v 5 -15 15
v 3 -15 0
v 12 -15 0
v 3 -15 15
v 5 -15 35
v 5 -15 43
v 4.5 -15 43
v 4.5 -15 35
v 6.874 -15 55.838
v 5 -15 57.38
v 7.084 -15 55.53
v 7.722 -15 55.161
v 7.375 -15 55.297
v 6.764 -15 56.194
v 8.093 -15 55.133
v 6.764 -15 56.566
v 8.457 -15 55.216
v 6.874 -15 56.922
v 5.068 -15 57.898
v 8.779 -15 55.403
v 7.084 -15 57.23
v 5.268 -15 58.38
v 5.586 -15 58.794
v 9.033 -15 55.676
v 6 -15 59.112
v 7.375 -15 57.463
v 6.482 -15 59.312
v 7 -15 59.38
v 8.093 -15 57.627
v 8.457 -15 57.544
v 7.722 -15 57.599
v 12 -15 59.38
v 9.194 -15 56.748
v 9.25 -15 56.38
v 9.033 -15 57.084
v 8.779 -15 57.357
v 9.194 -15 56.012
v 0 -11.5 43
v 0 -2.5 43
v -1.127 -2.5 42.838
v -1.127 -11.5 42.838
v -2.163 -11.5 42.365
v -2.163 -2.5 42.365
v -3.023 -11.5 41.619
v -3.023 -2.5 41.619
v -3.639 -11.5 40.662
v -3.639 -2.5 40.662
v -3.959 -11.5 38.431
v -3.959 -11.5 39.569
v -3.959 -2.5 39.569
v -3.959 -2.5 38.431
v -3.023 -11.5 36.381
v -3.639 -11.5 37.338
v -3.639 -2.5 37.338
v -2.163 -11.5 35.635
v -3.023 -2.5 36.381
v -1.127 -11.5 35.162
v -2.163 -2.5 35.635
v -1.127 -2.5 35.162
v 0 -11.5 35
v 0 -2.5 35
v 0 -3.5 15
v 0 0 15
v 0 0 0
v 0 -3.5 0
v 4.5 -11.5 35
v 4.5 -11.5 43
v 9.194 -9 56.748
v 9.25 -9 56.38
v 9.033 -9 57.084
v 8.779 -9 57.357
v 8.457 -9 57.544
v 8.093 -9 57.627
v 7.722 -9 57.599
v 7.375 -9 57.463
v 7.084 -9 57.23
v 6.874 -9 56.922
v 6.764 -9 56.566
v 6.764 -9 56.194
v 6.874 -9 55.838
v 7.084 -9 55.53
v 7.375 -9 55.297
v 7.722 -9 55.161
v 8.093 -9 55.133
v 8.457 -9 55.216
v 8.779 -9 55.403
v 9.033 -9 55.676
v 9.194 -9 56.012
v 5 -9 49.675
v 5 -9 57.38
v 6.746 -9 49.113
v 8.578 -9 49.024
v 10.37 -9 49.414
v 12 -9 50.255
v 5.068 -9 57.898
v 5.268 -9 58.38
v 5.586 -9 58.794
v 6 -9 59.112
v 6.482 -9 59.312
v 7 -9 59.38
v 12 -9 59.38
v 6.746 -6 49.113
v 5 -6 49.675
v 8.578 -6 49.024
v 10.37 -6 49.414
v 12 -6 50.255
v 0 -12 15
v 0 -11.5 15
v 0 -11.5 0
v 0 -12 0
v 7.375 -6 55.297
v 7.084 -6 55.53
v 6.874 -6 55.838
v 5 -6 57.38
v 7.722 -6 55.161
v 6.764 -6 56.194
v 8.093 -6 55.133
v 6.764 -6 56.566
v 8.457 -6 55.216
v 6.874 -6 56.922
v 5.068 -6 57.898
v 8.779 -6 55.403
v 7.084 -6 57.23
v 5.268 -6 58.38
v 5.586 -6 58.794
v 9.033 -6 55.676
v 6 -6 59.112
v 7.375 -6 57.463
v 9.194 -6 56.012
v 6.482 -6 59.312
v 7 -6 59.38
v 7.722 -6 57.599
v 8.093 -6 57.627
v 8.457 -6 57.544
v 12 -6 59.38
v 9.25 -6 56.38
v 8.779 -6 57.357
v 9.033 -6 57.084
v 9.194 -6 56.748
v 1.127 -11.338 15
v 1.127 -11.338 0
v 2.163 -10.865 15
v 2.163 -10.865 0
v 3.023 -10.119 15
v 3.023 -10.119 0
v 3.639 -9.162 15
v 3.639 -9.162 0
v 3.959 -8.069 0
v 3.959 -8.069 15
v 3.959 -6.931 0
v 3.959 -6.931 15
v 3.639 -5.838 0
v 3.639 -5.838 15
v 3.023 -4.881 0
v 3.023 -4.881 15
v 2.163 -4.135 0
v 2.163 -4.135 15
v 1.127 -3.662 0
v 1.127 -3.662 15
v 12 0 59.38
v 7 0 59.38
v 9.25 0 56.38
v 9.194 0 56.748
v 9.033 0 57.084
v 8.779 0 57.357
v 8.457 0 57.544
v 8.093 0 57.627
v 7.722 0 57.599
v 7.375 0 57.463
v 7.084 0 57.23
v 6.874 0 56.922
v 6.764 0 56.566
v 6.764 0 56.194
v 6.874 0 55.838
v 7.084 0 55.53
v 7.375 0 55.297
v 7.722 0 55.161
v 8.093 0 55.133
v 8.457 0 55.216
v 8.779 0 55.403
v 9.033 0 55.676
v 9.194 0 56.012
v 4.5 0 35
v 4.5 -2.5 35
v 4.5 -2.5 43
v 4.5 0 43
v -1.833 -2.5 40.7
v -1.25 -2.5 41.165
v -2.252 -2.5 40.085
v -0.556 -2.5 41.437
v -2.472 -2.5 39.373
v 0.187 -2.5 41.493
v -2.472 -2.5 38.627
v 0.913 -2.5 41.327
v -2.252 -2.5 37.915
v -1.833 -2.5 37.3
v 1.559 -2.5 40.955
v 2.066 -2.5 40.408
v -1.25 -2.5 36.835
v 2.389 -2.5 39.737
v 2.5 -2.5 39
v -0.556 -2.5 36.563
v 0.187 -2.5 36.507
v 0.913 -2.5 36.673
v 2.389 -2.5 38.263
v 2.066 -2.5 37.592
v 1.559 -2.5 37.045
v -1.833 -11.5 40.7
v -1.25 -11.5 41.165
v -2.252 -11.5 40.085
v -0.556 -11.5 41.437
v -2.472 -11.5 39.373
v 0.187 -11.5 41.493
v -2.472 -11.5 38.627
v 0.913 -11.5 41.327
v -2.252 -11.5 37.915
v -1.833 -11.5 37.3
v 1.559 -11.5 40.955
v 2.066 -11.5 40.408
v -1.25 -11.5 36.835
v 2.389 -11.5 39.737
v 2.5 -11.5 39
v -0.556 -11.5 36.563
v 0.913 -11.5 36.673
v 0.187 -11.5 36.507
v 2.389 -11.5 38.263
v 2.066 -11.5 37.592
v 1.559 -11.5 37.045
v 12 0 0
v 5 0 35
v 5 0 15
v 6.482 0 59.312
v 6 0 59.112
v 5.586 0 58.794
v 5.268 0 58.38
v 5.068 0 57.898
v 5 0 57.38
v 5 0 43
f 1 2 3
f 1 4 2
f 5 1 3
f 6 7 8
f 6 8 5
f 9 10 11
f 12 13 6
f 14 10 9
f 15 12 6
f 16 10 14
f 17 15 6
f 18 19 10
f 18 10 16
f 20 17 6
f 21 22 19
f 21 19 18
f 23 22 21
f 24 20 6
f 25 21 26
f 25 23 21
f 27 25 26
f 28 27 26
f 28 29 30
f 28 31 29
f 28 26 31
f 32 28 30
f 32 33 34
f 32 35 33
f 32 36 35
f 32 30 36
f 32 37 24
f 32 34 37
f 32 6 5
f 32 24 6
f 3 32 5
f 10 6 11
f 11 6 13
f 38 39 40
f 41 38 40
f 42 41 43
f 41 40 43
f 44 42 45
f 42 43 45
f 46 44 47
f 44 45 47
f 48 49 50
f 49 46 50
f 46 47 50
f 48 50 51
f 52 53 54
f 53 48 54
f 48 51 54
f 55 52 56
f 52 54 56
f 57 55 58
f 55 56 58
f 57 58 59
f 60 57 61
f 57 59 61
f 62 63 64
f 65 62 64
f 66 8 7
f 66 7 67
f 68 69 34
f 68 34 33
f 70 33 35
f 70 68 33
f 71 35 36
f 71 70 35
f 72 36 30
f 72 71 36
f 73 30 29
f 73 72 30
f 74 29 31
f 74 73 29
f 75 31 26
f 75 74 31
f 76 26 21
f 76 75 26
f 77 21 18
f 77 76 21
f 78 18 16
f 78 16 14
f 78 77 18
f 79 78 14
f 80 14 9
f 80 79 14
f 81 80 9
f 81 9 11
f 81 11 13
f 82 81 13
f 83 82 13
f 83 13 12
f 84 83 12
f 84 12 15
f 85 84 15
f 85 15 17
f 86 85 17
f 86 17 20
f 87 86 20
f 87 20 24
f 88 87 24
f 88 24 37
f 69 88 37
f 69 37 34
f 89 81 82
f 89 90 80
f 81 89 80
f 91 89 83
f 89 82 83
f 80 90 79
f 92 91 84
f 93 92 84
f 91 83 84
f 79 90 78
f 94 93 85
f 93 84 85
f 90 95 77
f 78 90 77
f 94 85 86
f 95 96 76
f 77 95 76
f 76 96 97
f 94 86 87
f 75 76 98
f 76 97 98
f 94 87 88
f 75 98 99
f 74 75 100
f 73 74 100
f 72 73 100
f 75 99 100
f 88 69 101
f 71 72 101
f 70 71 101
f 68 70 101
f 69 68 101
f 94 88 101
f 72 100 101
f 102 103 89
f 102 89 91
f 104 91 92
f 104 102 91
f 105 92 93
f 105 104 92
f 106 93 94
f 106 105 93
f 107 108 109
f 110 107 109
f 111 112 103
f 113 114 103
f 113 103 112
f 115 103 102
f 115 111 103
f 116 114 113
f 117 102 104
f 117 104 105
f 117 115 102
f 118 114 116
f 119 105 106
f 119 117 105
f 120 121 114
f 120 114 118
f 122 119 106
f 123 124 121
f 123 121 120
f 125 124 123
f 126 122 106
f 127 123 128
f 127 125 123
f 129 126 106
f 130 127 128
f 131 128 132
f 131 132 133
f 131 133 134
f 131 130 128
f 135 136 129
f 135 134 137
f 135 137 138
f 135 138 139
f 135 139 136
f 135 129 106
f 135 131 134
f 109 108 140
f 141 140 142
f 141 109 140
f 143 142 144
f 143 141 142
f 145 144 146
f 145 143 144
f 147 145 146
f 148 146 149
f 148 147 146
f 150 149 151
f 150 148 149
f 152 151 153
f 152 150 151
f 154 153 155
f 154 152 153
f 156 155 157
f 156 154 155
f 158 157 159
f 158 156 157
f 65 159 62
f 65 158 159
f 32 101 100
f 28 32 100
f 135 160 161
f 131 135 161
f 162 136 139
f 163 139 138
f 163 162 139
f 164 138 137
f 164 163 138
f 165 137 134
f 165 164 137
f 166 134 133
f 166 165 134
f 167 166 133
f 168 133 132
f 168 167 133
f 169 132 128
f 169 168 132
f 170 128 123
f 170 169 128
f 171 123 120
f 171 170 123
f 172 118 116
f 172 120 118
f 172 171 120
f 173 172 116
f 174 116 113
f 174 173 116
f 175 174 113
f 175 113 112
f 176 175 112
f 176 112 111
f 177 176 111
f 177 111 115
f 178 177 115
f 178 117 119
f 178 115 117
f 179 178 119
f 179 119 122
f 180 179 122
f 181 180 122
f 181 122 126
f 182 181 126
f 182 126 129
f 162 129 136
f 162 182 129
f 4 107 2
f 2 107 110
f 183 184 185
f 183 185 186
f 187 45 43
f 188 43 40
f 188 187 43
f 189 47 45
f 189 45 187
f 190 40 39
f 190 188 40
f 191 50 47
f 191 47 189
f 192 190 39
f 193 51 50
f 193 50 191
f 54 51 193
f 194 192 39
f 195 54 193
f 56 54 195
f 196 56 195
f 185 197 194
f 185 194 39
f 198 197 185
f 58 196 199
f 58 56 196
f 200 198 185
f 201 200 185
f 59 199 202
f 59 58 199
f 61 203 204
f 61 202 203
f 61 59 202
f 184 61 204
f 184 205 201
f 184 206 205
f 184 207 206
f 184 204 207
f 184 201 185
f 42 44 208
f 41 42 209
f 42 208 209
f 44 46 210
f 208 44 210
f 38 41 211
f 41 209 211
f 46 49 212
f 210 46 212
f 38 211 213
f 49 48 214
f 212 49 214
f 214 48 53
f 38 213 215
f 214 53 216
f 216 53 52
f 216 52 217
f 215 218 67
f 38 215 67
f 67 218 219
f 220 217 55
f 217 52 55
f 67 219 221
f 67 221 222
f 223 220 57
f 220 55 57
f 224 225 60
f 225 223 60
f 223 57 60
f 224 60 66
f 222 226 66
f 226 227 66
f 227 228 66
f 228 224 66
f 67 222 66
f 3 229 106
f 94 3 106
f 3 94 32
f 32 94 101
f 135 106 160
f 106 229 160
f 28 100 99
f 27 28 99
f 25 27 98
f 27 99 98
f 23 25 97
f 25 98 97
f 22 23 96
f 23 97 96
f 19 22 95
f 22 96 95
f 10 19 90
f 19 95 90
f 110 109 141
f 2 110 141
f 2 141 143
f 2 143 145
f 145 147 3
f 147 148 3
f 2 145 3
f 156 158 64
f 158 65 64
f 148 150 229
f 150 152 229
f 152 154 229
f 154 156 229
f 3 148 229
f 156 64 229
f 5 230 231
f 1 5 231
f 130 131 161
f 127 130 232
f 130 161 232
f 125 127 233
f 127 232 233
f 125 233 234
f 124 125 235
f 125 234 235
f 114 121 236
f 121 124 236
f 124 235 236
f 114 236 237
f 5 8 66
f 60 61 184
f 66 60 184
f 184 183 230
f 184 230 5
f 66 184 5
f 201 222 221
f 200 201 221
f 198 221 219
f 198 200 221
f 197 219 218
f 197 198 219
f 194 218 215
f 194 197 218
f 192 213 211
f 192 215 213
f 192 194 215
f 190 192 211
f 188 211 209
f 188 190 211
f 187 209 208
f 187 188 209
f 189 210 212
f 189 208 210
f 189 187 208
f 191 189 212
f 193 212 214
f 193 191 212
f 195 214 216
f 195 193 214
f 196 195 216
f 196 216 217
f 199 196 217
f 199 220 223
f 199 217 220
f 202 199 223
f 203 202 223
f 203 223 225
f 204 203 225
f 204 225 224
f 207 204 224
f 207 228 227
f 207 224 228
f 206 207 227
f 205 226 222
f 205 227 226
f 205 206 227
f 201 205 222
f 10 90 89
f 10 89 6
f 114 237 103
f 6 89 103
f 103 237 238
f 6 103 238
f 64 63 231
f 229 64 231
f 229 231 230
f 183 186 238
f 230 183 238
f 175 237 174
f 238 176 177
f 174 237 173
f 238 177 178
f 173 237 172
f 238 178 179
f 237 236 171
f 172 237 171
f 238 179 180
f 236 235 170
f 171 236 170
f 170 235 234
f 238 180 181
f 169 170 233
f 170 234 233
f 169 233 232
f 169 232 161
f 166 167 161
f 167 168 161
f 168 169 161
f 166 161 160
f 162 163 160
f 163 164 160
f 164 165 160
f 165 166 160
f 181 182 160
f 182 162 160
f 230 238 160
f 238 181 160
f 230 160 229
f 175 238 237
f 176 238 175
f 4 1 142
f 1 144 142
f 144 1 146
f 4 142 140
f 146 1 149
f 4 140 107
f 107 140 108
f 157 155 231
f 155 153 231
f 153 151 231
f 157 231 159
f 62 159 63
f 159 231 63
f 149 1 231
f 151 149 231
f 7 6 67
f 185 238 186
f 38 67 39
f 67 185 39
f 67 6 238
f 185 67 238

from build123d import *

# Parameters (mm, degrees)
SKETCH010_R       = 2.5
SKETCH010_R_2     = 1.25
PAD008_DEPTH      = 15
BOX001_W          = 11
BOX001_H          = 10
BOX001_DEPTH      = 10
BOX002_W          = 10
BOX002_H          = 10
BOX002_DEPTH      = 10
CHAMFER002_SIZE   = 3
CYLINDER004_R     = 7
CYLINDER004_DEPTH = 3
CYLINDER005_R     = 4
CYLINDER005_DEPTH = 31


with BuildPart() as part:
    # Sketch010 → Pad008 (new body)
    with BuildSketch(Plane.XZ):
        with BuildLine():
            Line((0, 35), (5, 35))
            Line((5, 35), (5, 15))
            Line((5, 15), (0, 15))
            Line((0, 15), (0, 0))
            Line((0, 0), (12, 0))
            Line((12, 0), (12, 59.38))
            Line((12, 59.38), (7, 59.38))
            ThreePointArc((7, 59.38), (5.585786, 58.794214), (5, 57.38))
            Line((5, 57.38), (5, 43))
            Line((5, 43), (0, 43))
            ThreePointArc((0, 43), (-4, 39), (0, 35))
        make_face()
        with Locations((0, 39)):
            Circle(SKETCH010_R, mode=Mode.SUBTRACT)
        with Locations((8, 56.38)):
            Circle(SKETCH010_R_2, mode=Mode.SUBTRACT)
    extrude(amount=PAD008_DEPTH)

    # Box001 → Box001 (cut)
    with BuildSketch(Plane(origin=(-6.5, -2.5, 34), x_dir=(1, 0, 0), z_dir=(0, 0, 1))):
        with Locations((5.5, 5)):
            Rectangle(BOX001_W, BOX001_H)
    extrude(amount=BOX001_DEPTH, mode=Mode.SUBTRACT)

    # Box002 → Box002 (cut)
    with BuildSketch(Plane(origin=(-5.5, -21.5, 34), x_dir=(1, 0, 0), z_dir=(0, 0, 1))):
        with Locations((5, 5)):
            Rectangle(BOX002_W, BOX002_H)
    extrude(amount=BOX002_DEPTH, mode=Mode.SUBTRACT)

    # Chamfer002
    chamfer002_edges = [part.edges().sort_by_distance(p)[0] for p in [
        (0, -15, 7.5),
    ]]
    chamfer(chamfer002_edges, length=CHAMFER002_SIZE)

    # Cylinder004 → Cylinder004 (cut)
    with BuildSketch(Plane(origin=(8, -6, 56), x_dir=(1, 0, 0), z_dir=(0, -1, 0))):
        Circle(CYLINDER004_R)
    extrude(amount=CYLINDER004_DEPTH, mode=Mode.SUBTRACT)

    # Cylinder005 → Cylinder005 (cut)
    with BuildSketch(Plane(origin=(0, -7.5, 0), x_dir=(1, 0, 0), z_dir=(0, 0, 1))):
        Circle(CYLINDER005_R)
    extrude(amount=CYLINDER005_DEPTH, mode=Mode.SUBTRACT)


solid = part.part
